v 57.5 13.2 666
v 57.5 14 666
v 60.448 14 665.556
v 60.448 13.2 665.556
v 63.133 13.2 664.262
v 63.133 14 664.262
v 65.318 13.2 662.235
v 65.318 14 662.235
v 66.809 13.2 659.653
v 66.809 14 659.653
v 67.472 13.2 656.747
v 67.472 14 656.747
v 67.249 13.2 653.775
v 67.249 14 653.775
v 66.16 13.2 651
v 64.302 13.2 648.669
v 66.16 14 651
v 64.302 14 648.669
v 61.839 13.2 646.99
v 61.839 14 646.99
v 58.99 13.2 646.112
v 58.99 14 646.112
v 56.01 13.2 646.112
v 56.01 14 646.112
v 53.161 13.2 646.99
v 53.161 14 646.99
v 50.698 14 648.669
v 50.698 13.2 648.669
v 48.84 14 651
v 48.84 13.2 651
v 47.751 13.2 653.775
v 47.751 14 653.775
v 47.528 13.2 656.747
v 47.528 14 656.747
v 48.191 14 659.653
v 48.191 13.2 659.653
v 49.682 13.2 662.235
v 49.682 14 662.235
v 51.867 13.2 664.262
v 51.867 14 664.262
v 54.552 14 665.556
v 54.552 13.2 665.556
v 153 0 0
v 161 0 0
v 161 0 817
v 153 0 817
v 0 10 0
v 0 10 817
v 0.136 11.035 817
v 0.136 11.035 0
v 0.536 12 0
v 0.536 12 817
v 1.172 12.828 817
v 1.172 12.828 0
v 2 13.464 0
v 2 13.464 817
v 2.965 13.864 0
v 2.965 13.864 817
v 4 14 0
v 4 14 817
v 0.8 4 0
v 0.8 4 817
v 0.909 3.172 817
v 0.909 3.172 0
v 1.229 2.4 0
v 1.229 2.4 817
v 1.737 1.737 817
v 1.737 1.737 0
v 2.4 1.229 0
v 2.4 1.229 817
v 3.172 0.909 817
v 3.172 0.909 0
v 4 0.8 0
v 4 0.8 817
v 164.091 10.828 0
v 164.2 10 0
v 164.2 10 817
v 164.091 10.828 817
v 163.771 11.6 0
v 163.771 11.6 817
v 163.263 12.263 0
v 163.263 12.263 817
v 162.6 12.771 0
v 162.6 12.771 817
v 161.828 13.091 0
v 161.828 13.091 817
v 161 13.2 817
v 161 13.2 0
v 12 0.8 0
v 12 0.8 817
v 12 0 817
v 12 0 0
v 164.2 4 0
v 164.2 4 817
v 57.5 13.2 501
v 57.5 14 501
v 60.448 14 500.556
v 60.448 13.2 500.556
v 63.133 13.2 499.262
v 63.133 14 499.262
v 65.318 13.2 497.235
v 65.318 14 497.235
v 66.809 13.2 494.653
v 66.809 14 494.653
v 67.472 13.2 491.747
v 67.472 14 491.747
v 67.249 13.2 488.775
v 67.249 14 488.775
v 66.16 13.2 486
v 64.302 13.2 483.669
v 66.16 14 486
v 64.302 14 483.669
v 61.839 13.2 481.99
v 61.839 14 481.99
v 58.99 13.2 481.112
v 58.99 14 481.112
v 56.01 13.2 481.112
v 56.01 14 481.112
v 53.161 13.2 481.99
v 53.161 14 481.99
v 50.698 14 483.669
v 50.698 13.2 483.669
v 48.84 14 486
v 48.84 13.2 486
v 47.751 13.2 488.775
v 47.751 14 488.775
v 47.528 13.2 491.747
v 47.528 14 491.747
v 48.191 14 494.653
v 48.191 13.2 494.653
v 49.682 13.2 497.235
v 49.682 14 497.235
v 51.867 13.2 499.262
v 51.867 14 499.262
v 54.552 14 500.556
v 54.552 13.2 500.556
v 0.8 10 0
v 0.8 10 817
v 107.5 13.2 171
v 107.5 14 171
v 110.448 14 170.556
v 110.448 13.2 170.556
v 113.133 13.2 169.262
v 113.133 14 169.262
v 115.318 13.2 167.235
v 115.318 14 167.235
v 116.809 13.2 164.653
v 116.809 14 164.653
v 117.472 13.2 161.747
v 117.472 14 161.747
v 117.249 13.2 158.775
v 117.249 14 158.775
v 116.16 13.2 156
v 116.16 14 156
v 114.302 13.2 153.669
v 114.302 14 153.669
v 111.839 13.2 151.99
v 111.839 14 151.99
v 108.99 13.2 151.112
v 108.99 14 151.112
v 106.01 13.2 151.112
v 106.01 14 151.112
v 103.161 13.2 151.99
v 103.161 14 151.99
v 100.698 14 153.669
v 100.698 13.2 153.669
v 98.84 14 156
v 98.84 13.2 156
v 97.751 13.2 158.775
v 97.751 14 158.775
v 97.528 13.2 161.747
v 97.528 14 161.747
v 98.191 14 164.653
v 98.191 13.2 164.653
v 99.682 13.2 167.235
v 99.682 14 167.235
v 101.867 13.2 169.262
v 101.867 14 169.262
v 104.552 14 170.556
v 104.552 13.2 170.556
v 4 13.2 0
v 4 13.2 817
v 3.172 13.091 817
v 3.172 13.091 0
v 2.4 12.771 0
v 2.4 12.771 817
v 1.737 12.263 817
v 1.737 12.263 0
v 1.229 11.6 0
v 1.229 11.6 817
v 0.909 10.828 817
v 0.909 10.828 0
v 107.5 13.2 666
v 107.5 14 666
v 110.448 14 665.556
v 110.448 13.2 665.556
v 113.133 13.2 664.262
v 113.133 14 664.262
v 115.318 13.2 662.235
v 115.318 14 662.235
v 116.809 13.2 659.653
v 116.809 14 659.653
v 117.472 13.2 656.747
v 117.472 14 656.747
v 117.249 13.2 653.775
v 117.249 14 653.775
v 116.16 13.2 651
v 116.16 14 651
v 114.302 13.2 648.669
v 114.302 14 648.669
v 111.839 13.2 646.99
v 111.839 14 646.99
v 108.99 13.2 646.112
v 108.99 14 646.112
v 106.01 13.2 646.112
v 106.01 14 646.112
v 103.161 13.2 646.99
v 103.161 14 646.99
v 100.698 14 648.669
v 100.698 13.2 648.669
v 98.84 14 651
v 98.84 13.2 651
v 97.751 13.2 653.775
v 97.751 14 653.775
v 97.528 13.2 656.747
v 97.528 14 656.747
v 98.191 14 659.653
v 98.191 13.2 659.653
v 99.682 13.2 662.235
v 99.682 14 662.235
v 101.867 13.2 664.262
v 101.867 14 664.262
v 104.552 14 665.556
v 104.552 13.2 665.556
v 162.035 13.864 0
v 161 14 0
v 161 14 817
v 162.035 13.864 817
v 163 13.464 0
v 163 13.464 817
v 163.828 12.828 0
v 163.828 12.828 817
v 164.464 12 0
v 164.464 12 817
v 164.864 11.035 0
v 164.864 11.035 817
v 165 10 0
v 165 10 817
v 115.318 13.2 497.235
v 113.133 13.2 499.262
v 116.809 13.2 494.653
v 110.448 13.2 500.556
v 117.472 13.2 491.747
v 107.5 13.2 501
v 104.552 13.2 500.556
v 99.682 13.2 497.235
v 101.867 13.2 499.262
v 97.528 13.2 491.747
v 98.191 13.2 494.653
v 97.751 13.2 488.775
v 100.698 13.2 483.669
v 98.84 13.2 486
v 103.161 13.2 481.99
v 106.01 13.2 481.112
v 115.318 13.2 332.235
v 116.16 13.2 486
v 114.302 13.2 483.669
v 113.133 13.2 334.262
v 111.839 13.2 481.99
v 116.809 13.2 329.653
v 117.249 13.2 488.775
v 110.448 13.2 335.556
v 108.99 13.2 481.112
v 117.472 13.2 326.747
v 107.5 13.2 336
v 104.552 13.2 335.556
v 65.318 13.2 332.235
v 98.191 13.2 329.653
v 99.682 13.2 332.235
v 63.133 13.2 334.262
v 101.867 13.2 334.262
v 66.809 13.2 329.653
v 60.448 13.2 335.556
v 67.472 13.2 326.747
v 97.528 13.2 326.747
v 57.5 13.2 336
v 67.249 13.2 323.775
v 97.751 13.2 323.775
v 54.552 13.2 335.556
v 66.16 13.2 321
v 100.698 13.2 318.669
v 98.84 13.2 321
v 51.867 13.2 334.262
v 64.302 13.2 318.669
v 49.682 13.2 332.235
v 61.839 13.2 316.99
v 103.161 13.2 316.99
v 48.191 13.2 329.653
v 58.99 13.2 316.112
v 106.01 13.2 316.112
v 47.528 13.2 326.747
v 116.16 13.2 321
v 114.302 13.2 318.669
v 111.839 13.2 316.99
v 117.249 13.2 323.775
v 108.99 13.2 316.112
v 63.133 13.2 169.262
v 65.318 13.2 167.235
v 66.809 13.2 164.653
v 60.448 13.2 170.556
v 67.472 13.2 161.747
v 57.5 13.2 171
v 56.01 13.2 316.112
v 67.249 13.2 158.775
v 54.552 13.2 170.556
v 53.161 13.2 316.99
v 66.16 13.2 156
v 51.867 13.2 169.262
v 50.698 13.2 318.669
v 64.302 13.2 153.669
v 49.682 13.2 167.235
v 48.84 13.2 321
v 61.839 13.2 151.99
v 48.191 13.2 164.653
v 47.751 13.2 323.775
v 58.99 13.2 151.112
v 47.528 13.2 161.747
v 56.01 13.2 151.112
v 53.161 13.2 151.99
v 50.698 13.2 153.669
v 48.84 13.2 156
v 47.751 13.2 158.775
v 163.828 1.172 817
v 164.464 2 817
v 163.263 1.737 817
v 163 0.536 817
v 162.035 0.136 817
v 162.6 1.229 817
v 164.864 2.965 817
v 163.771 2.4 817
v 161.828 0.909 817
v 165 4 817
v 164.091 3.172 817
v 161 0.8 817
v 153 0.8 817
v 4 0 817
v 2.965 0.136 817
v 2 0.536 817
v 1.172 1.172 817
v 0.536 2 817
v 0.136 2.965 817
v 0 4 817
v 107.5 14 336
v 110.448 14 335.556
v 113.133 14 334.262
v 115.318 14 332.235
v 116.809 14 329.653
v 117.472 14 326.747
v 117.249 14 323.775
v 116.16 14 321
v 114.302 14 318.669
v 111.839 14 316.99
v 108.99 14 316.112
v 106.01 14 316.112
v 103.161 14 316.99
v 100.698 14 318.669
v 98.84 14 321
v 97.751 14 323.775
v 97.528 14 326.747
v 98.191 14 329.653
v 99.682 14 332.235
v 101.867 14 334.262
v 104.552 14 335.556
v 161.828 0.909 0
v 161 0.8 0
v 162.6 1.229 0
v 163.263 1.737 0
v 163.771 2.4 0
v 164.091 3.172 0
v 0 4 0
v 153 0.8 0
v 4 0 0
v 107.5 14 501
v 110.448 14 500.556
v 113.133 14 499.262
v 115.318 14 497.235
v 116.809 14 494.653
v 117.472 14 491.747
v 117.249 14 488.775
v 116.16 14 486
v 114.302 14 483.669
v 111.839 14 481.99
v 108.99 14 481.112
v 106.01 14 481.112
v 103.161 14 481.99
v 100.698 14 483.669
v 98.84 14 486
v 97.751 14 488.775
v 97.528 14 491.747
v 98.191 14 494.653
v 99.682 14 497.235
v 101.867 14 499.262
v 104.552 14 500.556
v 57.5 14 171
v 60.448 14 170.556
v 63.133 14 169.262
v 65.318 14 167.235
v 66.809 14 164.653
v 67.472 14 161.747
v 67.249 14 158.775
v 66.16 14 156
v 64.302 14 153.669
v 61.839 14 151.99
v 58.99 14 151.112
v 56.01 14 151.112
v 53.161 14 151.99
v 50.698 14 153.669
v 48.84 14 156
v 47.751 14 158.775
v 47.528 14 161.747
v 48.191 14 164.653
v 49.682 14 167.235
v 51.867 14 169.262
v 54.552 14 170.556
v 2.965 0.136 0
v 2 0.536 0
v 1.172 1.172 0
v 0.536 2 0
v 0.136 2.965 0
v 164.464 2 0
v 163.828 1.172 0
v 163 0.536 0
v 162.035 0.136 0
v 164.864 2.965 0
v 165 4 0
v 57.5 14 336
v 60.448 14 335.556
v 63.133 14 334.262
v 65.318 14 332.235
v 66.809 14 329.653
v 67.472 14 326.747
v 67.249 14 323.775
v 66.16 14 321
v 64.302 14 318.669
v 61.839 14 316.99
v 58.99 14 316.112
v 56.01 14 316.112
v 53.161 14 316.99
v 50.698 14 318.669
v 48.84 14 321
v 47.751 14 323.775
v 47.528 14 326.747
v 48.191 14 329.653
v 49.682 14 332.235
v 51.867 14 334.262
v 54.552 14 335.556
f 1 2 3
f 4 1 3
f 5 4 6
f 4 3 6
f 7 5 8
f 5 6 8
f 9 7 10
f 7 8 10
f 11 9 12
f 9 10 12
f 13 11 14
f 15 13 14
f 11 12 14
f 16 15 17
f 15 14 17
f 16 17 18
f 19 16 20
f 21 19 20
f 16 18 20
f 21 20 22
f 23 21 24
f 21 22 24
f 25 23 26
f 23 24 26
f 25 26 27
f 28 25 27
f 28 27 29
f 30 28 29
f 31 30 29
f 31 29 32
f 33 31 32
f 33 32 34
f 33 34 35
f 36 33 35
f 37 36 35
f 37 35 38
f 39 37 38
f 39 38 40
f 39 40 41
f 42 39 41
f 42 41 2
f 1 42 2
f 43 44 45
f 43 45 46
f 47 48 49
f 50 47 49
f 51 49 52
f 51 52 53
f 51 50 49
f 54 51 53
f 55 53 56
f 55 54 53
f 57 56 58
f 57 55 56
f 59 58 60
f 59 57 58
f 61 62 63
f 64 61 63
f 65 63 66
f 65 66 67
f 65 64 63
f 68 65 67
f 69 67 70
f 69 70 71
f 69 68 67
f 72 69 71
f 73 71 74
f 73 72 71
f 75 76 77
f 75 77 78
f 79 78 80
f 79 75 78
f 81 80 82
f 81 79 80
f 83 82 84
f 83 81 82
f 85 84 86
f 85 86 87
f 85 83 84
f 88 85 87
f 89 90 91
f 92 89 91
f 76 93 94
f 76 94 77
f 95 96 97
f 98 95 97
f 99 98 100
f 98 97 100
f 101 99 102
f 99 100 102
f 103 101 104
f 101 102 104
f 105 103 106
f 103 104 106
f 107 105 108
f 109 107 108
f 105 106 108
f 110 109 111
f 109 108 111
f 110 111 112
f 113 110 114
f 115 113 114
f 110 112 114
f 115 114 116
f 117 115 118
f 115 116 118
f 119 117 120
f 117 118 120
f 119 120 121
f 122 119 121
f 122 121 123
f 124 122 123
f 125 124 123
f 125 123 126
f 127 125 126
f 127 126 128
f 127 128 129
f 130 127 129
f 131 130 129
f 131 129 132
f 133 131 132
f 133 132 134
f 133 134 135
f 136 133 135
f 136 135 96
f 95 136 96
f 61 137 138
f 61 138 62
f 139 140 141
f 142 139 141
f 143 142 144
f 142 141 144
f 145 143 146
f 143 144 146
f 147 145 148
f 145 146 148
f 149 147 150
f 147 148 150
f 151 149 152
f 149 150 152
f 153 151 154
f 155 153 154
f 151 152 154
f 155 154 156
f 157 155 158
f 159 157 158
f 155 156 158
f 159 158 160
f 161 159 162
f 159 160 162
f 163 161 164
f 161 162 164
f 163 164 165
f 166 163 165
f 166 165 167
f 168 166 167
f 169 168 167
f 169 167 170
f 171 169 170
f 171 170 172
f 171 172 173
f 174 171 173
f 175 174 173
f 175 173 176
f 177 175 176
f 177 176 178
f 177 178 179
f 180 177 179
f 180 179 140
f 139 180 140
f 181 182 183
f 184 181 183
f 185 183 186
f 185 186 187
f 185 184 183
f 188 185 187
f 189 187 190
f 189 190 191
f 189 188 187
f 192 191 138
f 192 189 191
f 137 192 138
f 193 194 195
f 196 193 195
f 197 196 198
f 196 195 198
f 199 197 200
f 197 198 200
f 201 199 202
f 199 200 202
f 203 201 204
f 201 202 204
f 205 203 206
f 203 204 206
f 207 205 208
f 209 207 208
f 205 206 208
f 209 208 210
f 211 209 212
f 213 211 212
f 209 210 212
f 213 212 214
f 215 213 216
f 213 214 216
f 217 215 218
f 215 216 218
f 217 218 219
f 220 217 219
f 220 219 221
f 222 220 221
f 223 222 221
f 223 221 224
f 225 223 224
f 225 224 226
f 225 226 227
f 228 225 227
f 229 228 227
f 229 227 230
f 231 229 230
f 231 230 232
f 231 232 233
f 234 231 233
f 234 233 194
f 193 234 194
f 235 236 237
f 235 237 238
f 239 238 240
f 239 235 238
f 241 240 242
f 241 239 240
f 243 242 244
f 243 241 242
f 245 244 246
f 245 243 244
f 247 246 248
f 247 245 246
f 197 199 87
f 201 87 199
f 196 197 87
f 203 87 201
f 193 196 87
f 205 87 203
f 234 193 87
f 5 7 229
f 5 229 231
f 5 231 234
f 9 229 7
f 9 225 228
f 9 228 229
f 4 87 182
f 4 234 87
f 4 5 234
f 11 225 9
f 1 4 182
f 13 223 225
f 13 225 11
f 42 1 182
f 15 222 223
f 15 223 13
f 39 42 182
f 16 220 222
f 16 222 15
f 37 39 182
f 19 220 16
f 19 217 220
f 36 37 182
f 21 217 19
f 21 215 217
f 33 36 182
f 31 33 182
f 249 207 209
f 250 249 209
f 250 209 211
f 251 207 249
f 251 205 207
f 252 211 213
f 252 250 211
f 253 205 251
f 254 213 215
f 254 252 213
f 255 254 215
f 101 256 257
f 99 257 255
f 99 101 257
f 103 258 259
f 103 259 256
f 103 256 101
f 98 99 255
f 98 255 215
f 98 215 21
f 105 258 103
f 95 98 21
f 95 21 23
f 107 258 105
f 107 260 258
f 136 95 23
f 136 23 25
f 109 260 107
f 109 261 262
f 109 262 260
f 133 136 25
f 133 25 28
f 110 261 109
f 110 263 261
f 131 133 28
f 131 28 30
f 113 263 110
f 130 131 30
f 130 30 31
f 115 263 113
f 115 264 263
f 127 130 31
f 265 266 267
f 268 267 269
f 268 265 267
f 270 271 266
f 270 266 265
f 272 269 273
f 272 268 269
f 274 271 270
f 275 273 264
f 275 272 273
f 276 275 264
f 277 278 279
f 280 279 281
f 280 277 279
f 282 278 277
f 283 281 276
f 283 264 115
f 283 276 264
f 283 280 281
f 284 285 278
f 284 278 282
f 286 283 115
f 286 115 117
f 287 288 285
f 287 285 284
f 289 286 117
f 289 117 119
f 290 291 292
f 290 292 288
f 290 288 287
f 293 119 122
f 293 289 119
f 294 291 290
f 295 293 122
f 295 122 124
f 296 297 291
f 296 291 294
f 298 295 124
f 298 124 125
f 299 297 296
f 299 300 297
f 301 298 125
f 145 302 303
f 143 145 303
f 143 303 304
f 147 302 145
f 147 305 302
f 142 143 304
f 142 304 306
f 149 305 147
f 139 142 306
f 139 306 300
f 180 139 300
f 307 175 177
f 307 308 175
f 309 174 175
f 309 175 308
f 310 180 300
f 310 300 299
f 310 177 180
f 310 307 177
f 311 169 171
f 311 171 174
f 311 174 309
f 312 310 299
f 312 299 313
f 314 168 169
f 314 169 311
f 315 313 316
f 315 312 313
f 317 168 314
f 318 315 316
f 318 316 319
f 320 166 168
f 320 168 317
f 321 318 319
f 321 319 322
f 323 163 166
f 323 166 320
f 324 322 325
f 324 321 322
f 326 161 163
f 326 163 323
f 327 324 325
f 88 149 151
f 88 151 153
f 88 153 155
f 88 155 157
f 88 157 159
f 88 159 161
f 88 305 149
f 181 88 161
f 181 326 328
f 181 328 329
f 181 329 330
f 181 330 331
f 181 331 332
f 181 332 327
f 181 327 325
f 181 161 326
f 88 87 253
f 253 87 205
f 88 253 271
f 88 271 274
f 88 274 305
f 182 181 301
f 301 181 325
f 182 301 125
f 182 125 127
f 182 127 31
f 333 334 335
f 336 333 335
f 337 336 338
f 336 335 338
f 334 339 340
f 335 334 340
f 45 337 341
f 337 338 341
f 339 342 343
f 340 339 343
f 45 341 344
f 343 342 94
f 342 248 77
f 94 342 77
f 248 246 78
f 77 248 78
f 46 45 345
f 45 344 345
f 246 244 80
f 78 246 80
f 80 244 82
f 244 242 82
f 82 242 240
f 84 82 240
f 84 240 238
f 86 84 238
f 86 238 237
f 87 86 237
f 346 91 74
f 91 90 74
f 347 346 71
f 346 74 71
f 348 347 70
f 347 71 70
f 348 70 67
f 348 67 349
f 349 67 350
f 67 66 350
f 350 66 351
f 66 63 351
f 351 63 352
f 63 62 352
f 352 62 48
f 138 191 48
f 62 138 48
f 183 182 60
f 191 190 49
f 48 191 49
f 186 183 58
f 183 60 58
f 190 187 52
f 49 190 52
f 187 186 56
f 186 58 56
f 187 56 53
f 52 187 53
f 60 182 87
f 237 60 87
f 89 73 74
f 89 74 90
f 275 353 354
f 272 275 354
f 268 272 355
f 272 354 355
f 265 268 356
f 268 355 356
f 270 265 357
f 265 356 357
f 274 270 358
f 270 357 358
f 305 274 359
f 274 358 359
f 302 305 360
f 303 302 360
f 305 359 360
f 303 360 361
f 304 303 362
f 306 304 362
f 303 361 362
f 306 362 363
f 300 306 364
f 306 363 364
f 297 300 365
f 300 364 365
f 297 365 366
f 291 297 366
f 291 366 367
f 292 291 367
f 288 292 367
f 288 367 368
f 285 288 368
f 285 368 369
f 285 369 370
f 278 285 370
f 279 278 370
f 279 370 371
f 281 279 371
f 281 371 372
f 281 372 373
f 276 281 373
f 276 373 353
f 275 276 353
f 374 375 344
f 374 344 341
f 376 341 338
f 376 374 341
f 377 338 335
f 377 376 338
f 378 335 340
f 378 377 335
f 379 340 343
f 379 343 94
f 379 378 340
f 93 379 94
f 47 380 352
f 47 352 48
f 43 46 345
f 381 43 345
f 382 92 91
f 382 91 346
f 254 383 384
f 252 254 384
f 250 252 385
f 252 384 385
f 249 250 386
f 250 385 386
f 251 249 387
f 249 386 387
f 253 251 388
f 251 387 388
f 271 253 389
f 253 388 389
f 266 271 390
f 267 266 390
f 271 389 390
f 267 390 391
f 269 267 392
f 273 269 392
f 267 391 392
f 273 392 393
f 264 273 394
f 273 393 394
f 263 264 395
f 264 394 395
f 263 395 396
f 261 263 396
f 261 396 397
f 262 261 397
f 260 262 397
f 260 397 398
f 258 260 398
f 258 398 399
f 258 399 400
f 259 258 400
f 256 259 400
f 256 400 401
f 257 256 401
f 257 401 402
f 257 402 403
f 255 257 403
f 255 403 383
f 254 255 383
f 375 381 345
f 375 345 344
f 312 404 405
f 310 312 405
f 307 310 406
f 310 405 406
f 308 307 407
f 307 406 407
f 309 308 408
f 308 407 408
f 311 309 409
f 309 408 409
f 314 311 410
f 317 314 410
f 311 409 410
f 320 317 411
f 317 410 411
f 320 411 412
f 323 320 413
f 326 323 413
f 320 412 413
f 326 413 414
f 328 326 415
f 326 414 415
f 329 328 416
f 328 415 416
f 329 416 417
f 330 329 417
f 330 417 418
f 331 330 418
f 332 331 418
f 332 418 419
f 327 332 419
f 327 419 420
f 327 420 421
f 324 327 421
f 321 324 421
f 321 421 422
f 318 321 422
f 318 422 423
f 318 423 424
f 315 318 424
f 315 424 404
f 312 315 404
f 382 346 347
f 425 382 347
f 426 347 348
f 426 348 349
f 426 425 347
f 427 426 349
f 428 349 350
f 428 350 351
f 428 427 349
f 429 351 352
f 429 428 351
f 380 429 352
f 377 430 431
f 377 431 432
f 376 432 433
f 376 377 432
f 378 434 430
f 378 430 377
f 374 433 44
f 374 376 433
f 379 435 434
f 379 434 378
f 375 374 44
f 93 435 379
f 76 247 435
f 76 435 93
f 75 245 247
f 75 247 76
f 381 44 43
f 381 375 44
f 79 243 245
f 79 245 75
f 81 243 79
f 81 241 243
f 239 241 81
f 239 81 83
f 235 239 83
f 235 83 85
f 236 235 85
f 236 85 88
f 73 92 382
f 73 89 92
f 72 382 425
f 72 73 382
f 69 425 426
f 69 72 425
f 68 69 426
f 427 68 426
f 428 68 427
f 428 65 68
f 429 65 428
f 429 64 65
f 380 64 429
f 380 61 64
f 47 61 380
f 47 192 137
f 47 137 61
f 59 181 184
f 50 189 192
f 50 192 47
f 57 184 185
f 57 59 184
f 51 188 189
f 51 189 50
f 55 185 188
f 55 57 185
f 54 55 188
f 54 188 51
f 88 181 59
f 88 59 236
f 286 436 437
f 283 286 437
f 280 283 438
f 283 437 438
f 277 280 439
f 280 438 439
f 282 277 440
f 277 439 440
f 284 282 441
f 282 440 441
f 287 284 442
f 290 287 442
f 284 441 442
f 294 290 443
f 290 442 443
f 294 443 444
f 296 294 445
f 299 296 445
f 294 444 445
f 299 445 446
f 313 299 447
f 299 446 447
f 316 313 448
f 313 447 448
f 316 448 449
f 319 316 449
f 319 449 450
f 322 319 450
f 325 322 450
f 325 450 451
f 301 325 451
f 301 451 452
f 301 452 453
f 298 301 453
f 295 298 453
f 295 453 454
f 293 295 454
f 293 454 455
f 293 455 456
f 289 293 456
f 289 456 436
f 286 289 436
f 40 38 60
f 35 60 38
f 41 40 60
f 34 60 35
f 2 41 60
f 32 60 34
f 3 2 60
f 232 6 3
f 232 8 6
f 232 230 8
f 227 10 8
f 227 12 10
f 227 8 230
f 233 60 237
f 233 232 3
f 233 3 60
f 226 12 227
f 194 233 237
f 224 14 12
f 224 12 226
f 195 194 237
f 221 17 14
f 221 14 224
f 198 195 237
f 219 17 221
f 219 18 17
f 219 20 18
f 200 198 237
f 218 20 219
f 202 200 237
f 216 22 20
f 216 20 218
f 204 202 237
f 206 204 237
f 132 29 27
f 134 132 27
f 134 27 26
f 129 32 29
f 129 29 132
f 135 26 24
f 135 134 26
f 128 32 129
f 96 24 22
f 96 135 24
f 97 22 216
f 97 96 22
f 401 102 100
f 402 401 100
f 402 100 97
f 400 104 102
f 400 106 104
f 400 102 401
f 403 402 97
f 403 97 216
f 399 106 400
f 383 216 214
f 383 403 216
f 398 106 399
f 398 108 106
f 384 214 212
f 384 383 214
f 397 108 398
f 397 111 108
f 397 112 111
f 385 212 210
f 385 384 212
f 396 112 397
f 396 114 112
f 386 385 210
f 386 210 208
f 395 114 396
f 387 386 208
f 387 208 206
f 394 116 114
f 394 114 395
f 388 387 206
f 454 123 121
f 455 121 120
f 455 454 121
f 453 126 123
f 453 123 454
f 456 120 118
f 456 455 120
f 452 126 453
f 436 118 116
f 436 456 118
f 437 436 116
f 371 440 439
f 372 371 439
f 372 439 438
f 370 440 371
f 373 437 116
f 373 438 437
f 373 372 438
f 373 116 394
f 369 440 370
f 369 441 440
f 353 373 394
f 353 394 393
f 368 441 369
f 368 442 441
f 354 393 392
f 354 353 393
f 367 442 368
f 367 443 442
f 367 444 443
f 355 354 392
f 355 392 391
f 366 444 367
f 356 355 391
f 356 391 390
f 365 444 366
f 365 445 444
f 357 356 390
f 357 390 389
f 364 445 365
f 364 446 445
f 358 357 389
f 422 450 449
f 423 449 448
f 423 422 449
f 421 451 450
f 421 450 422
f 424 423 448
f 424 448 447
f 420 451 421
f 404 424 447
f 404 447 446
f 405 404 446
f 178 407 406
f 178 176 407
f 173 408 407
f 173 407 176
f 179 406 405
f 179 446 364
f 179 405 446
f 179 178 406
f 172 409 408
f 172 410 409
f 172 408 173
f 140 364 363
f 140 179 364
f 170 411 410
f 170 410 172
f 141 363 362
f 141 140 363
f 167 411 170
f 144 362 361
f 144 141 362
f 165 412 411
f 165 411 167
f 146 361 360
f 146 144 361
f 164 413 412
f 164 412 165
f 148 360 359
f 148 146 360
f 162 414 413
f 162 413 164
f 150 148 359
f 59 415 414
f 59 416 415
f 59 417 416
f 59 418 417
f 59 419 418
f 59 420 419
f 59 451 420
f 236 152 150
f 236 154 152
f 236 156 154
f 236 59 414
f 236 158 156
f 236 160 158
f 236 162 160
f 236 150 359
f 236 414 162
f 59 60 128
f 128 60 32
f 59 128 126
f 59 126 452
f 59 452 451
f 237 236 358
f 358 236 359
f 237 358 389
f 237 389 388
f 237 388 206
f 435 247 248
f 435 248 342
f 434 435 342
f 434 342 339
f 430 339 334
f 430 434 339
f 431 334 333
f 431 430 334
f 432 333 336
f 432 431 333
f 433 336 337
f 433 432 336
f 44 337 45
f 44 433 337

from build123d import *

# Parameters (mm, degrees)
BASE_FLANGE1_DEPTH = 817
SKETCH6_R          = 10
CUT_EXTRUDE1_DEPTH = 10


# Sheet-metal steps are written as plain solids
with BuildPart() as part:
    # Sketch1 → Base-Flange1 (new body)
    with BuildSketch(Plane.XY):
        with BuildLine():
            Line((12, 0), (4, 0))
            ThreePointArc((4, 0), (1.171572875, 1.171572875), (0, 4))
            Line((0, 4), (0, 10))
            ThreePointArc((0, 10), (1.171572875, 12.828427125), (4, 14))
            Line((4, 14), (161, 14))
            ThreePointArc((161, 14), (163.828427125, 12.828427125), (165, 10))
            Line((165, 10), (165, 4))
            ThreePointArc((165, 4), (163.828427125, 1.171572875), (161, 0))
            Line((161, 0), (153, 0))
            Line((153, 0), (153, 0.8))
            Line((153, 0.8), (161, 0.8))
            ThreePointArc((161, 0.8), (163.2627417, 1.7372583), (164.2, 4))
            Line((164.2, 4), (164.2, 10))
            ThreePointArc((164.2, 10), (163.2627417, 12.2627417), (161, 13.2))
            Line((161, 13.2), (4, 13.2))
            ThreePointArc((4, 13.2), (1.7372583, 12.2627417), (0.8, 10))
            Line((0.8, 10), (0.8, 4))
            ThreePointArc((0.8, 4), (1.7372583, 1.7372583), (4, 0.8))
            Line((4, 0.8), (12, 0.8))
            Line((12, 0.8), (12, 0))
        make_face()
    extrude(amount=BASE_FLANGE1_DEPTH)

    # Sketch6 → Cut-Extrude1 (cut)
    with BuildSketch(Plane(origin=(0, 14, 0), x_dir=(1, 0, 0), z_dir=(0, 1, 0))):
        with Locations(Location((107.5, -326, 0), (0, 0, 270))):
            Circle(SKETCH6_R)
        with Locations(Location((107.5, -161, 0), (0, 0, 270))):
            Circle(SKETCH6_R)
        with Locations(Location((107.5, -491, 0), (0, 0, 270))):
            Circle(SKETCH6_R)
        with Locations(Location((107.5, -656, 0), (0, 0, 270))):
            Circle(SKETCH6_R)
        with Locations(Location((57.5, -656, 0), (0, 0, 270))):
            Circle(SKETCH6_R)
        with Locations(Location((57.5, -491, 0), (0, 0, 270))):
            Circle(SKETCH6_R)
        with Locations(Location((57.5, -326, 0), (0, 0, 270))):
            Circle(SKETCH6_R)
        with Locations(Location((57.5, -161, 0), (0, 0, 270))):
            Circle(SKETCH6_R)
    extrude(amount=-CUT_EXTRUDE1_DEPTH, mode=Mode.SUBTRACT)


solid = part.part
